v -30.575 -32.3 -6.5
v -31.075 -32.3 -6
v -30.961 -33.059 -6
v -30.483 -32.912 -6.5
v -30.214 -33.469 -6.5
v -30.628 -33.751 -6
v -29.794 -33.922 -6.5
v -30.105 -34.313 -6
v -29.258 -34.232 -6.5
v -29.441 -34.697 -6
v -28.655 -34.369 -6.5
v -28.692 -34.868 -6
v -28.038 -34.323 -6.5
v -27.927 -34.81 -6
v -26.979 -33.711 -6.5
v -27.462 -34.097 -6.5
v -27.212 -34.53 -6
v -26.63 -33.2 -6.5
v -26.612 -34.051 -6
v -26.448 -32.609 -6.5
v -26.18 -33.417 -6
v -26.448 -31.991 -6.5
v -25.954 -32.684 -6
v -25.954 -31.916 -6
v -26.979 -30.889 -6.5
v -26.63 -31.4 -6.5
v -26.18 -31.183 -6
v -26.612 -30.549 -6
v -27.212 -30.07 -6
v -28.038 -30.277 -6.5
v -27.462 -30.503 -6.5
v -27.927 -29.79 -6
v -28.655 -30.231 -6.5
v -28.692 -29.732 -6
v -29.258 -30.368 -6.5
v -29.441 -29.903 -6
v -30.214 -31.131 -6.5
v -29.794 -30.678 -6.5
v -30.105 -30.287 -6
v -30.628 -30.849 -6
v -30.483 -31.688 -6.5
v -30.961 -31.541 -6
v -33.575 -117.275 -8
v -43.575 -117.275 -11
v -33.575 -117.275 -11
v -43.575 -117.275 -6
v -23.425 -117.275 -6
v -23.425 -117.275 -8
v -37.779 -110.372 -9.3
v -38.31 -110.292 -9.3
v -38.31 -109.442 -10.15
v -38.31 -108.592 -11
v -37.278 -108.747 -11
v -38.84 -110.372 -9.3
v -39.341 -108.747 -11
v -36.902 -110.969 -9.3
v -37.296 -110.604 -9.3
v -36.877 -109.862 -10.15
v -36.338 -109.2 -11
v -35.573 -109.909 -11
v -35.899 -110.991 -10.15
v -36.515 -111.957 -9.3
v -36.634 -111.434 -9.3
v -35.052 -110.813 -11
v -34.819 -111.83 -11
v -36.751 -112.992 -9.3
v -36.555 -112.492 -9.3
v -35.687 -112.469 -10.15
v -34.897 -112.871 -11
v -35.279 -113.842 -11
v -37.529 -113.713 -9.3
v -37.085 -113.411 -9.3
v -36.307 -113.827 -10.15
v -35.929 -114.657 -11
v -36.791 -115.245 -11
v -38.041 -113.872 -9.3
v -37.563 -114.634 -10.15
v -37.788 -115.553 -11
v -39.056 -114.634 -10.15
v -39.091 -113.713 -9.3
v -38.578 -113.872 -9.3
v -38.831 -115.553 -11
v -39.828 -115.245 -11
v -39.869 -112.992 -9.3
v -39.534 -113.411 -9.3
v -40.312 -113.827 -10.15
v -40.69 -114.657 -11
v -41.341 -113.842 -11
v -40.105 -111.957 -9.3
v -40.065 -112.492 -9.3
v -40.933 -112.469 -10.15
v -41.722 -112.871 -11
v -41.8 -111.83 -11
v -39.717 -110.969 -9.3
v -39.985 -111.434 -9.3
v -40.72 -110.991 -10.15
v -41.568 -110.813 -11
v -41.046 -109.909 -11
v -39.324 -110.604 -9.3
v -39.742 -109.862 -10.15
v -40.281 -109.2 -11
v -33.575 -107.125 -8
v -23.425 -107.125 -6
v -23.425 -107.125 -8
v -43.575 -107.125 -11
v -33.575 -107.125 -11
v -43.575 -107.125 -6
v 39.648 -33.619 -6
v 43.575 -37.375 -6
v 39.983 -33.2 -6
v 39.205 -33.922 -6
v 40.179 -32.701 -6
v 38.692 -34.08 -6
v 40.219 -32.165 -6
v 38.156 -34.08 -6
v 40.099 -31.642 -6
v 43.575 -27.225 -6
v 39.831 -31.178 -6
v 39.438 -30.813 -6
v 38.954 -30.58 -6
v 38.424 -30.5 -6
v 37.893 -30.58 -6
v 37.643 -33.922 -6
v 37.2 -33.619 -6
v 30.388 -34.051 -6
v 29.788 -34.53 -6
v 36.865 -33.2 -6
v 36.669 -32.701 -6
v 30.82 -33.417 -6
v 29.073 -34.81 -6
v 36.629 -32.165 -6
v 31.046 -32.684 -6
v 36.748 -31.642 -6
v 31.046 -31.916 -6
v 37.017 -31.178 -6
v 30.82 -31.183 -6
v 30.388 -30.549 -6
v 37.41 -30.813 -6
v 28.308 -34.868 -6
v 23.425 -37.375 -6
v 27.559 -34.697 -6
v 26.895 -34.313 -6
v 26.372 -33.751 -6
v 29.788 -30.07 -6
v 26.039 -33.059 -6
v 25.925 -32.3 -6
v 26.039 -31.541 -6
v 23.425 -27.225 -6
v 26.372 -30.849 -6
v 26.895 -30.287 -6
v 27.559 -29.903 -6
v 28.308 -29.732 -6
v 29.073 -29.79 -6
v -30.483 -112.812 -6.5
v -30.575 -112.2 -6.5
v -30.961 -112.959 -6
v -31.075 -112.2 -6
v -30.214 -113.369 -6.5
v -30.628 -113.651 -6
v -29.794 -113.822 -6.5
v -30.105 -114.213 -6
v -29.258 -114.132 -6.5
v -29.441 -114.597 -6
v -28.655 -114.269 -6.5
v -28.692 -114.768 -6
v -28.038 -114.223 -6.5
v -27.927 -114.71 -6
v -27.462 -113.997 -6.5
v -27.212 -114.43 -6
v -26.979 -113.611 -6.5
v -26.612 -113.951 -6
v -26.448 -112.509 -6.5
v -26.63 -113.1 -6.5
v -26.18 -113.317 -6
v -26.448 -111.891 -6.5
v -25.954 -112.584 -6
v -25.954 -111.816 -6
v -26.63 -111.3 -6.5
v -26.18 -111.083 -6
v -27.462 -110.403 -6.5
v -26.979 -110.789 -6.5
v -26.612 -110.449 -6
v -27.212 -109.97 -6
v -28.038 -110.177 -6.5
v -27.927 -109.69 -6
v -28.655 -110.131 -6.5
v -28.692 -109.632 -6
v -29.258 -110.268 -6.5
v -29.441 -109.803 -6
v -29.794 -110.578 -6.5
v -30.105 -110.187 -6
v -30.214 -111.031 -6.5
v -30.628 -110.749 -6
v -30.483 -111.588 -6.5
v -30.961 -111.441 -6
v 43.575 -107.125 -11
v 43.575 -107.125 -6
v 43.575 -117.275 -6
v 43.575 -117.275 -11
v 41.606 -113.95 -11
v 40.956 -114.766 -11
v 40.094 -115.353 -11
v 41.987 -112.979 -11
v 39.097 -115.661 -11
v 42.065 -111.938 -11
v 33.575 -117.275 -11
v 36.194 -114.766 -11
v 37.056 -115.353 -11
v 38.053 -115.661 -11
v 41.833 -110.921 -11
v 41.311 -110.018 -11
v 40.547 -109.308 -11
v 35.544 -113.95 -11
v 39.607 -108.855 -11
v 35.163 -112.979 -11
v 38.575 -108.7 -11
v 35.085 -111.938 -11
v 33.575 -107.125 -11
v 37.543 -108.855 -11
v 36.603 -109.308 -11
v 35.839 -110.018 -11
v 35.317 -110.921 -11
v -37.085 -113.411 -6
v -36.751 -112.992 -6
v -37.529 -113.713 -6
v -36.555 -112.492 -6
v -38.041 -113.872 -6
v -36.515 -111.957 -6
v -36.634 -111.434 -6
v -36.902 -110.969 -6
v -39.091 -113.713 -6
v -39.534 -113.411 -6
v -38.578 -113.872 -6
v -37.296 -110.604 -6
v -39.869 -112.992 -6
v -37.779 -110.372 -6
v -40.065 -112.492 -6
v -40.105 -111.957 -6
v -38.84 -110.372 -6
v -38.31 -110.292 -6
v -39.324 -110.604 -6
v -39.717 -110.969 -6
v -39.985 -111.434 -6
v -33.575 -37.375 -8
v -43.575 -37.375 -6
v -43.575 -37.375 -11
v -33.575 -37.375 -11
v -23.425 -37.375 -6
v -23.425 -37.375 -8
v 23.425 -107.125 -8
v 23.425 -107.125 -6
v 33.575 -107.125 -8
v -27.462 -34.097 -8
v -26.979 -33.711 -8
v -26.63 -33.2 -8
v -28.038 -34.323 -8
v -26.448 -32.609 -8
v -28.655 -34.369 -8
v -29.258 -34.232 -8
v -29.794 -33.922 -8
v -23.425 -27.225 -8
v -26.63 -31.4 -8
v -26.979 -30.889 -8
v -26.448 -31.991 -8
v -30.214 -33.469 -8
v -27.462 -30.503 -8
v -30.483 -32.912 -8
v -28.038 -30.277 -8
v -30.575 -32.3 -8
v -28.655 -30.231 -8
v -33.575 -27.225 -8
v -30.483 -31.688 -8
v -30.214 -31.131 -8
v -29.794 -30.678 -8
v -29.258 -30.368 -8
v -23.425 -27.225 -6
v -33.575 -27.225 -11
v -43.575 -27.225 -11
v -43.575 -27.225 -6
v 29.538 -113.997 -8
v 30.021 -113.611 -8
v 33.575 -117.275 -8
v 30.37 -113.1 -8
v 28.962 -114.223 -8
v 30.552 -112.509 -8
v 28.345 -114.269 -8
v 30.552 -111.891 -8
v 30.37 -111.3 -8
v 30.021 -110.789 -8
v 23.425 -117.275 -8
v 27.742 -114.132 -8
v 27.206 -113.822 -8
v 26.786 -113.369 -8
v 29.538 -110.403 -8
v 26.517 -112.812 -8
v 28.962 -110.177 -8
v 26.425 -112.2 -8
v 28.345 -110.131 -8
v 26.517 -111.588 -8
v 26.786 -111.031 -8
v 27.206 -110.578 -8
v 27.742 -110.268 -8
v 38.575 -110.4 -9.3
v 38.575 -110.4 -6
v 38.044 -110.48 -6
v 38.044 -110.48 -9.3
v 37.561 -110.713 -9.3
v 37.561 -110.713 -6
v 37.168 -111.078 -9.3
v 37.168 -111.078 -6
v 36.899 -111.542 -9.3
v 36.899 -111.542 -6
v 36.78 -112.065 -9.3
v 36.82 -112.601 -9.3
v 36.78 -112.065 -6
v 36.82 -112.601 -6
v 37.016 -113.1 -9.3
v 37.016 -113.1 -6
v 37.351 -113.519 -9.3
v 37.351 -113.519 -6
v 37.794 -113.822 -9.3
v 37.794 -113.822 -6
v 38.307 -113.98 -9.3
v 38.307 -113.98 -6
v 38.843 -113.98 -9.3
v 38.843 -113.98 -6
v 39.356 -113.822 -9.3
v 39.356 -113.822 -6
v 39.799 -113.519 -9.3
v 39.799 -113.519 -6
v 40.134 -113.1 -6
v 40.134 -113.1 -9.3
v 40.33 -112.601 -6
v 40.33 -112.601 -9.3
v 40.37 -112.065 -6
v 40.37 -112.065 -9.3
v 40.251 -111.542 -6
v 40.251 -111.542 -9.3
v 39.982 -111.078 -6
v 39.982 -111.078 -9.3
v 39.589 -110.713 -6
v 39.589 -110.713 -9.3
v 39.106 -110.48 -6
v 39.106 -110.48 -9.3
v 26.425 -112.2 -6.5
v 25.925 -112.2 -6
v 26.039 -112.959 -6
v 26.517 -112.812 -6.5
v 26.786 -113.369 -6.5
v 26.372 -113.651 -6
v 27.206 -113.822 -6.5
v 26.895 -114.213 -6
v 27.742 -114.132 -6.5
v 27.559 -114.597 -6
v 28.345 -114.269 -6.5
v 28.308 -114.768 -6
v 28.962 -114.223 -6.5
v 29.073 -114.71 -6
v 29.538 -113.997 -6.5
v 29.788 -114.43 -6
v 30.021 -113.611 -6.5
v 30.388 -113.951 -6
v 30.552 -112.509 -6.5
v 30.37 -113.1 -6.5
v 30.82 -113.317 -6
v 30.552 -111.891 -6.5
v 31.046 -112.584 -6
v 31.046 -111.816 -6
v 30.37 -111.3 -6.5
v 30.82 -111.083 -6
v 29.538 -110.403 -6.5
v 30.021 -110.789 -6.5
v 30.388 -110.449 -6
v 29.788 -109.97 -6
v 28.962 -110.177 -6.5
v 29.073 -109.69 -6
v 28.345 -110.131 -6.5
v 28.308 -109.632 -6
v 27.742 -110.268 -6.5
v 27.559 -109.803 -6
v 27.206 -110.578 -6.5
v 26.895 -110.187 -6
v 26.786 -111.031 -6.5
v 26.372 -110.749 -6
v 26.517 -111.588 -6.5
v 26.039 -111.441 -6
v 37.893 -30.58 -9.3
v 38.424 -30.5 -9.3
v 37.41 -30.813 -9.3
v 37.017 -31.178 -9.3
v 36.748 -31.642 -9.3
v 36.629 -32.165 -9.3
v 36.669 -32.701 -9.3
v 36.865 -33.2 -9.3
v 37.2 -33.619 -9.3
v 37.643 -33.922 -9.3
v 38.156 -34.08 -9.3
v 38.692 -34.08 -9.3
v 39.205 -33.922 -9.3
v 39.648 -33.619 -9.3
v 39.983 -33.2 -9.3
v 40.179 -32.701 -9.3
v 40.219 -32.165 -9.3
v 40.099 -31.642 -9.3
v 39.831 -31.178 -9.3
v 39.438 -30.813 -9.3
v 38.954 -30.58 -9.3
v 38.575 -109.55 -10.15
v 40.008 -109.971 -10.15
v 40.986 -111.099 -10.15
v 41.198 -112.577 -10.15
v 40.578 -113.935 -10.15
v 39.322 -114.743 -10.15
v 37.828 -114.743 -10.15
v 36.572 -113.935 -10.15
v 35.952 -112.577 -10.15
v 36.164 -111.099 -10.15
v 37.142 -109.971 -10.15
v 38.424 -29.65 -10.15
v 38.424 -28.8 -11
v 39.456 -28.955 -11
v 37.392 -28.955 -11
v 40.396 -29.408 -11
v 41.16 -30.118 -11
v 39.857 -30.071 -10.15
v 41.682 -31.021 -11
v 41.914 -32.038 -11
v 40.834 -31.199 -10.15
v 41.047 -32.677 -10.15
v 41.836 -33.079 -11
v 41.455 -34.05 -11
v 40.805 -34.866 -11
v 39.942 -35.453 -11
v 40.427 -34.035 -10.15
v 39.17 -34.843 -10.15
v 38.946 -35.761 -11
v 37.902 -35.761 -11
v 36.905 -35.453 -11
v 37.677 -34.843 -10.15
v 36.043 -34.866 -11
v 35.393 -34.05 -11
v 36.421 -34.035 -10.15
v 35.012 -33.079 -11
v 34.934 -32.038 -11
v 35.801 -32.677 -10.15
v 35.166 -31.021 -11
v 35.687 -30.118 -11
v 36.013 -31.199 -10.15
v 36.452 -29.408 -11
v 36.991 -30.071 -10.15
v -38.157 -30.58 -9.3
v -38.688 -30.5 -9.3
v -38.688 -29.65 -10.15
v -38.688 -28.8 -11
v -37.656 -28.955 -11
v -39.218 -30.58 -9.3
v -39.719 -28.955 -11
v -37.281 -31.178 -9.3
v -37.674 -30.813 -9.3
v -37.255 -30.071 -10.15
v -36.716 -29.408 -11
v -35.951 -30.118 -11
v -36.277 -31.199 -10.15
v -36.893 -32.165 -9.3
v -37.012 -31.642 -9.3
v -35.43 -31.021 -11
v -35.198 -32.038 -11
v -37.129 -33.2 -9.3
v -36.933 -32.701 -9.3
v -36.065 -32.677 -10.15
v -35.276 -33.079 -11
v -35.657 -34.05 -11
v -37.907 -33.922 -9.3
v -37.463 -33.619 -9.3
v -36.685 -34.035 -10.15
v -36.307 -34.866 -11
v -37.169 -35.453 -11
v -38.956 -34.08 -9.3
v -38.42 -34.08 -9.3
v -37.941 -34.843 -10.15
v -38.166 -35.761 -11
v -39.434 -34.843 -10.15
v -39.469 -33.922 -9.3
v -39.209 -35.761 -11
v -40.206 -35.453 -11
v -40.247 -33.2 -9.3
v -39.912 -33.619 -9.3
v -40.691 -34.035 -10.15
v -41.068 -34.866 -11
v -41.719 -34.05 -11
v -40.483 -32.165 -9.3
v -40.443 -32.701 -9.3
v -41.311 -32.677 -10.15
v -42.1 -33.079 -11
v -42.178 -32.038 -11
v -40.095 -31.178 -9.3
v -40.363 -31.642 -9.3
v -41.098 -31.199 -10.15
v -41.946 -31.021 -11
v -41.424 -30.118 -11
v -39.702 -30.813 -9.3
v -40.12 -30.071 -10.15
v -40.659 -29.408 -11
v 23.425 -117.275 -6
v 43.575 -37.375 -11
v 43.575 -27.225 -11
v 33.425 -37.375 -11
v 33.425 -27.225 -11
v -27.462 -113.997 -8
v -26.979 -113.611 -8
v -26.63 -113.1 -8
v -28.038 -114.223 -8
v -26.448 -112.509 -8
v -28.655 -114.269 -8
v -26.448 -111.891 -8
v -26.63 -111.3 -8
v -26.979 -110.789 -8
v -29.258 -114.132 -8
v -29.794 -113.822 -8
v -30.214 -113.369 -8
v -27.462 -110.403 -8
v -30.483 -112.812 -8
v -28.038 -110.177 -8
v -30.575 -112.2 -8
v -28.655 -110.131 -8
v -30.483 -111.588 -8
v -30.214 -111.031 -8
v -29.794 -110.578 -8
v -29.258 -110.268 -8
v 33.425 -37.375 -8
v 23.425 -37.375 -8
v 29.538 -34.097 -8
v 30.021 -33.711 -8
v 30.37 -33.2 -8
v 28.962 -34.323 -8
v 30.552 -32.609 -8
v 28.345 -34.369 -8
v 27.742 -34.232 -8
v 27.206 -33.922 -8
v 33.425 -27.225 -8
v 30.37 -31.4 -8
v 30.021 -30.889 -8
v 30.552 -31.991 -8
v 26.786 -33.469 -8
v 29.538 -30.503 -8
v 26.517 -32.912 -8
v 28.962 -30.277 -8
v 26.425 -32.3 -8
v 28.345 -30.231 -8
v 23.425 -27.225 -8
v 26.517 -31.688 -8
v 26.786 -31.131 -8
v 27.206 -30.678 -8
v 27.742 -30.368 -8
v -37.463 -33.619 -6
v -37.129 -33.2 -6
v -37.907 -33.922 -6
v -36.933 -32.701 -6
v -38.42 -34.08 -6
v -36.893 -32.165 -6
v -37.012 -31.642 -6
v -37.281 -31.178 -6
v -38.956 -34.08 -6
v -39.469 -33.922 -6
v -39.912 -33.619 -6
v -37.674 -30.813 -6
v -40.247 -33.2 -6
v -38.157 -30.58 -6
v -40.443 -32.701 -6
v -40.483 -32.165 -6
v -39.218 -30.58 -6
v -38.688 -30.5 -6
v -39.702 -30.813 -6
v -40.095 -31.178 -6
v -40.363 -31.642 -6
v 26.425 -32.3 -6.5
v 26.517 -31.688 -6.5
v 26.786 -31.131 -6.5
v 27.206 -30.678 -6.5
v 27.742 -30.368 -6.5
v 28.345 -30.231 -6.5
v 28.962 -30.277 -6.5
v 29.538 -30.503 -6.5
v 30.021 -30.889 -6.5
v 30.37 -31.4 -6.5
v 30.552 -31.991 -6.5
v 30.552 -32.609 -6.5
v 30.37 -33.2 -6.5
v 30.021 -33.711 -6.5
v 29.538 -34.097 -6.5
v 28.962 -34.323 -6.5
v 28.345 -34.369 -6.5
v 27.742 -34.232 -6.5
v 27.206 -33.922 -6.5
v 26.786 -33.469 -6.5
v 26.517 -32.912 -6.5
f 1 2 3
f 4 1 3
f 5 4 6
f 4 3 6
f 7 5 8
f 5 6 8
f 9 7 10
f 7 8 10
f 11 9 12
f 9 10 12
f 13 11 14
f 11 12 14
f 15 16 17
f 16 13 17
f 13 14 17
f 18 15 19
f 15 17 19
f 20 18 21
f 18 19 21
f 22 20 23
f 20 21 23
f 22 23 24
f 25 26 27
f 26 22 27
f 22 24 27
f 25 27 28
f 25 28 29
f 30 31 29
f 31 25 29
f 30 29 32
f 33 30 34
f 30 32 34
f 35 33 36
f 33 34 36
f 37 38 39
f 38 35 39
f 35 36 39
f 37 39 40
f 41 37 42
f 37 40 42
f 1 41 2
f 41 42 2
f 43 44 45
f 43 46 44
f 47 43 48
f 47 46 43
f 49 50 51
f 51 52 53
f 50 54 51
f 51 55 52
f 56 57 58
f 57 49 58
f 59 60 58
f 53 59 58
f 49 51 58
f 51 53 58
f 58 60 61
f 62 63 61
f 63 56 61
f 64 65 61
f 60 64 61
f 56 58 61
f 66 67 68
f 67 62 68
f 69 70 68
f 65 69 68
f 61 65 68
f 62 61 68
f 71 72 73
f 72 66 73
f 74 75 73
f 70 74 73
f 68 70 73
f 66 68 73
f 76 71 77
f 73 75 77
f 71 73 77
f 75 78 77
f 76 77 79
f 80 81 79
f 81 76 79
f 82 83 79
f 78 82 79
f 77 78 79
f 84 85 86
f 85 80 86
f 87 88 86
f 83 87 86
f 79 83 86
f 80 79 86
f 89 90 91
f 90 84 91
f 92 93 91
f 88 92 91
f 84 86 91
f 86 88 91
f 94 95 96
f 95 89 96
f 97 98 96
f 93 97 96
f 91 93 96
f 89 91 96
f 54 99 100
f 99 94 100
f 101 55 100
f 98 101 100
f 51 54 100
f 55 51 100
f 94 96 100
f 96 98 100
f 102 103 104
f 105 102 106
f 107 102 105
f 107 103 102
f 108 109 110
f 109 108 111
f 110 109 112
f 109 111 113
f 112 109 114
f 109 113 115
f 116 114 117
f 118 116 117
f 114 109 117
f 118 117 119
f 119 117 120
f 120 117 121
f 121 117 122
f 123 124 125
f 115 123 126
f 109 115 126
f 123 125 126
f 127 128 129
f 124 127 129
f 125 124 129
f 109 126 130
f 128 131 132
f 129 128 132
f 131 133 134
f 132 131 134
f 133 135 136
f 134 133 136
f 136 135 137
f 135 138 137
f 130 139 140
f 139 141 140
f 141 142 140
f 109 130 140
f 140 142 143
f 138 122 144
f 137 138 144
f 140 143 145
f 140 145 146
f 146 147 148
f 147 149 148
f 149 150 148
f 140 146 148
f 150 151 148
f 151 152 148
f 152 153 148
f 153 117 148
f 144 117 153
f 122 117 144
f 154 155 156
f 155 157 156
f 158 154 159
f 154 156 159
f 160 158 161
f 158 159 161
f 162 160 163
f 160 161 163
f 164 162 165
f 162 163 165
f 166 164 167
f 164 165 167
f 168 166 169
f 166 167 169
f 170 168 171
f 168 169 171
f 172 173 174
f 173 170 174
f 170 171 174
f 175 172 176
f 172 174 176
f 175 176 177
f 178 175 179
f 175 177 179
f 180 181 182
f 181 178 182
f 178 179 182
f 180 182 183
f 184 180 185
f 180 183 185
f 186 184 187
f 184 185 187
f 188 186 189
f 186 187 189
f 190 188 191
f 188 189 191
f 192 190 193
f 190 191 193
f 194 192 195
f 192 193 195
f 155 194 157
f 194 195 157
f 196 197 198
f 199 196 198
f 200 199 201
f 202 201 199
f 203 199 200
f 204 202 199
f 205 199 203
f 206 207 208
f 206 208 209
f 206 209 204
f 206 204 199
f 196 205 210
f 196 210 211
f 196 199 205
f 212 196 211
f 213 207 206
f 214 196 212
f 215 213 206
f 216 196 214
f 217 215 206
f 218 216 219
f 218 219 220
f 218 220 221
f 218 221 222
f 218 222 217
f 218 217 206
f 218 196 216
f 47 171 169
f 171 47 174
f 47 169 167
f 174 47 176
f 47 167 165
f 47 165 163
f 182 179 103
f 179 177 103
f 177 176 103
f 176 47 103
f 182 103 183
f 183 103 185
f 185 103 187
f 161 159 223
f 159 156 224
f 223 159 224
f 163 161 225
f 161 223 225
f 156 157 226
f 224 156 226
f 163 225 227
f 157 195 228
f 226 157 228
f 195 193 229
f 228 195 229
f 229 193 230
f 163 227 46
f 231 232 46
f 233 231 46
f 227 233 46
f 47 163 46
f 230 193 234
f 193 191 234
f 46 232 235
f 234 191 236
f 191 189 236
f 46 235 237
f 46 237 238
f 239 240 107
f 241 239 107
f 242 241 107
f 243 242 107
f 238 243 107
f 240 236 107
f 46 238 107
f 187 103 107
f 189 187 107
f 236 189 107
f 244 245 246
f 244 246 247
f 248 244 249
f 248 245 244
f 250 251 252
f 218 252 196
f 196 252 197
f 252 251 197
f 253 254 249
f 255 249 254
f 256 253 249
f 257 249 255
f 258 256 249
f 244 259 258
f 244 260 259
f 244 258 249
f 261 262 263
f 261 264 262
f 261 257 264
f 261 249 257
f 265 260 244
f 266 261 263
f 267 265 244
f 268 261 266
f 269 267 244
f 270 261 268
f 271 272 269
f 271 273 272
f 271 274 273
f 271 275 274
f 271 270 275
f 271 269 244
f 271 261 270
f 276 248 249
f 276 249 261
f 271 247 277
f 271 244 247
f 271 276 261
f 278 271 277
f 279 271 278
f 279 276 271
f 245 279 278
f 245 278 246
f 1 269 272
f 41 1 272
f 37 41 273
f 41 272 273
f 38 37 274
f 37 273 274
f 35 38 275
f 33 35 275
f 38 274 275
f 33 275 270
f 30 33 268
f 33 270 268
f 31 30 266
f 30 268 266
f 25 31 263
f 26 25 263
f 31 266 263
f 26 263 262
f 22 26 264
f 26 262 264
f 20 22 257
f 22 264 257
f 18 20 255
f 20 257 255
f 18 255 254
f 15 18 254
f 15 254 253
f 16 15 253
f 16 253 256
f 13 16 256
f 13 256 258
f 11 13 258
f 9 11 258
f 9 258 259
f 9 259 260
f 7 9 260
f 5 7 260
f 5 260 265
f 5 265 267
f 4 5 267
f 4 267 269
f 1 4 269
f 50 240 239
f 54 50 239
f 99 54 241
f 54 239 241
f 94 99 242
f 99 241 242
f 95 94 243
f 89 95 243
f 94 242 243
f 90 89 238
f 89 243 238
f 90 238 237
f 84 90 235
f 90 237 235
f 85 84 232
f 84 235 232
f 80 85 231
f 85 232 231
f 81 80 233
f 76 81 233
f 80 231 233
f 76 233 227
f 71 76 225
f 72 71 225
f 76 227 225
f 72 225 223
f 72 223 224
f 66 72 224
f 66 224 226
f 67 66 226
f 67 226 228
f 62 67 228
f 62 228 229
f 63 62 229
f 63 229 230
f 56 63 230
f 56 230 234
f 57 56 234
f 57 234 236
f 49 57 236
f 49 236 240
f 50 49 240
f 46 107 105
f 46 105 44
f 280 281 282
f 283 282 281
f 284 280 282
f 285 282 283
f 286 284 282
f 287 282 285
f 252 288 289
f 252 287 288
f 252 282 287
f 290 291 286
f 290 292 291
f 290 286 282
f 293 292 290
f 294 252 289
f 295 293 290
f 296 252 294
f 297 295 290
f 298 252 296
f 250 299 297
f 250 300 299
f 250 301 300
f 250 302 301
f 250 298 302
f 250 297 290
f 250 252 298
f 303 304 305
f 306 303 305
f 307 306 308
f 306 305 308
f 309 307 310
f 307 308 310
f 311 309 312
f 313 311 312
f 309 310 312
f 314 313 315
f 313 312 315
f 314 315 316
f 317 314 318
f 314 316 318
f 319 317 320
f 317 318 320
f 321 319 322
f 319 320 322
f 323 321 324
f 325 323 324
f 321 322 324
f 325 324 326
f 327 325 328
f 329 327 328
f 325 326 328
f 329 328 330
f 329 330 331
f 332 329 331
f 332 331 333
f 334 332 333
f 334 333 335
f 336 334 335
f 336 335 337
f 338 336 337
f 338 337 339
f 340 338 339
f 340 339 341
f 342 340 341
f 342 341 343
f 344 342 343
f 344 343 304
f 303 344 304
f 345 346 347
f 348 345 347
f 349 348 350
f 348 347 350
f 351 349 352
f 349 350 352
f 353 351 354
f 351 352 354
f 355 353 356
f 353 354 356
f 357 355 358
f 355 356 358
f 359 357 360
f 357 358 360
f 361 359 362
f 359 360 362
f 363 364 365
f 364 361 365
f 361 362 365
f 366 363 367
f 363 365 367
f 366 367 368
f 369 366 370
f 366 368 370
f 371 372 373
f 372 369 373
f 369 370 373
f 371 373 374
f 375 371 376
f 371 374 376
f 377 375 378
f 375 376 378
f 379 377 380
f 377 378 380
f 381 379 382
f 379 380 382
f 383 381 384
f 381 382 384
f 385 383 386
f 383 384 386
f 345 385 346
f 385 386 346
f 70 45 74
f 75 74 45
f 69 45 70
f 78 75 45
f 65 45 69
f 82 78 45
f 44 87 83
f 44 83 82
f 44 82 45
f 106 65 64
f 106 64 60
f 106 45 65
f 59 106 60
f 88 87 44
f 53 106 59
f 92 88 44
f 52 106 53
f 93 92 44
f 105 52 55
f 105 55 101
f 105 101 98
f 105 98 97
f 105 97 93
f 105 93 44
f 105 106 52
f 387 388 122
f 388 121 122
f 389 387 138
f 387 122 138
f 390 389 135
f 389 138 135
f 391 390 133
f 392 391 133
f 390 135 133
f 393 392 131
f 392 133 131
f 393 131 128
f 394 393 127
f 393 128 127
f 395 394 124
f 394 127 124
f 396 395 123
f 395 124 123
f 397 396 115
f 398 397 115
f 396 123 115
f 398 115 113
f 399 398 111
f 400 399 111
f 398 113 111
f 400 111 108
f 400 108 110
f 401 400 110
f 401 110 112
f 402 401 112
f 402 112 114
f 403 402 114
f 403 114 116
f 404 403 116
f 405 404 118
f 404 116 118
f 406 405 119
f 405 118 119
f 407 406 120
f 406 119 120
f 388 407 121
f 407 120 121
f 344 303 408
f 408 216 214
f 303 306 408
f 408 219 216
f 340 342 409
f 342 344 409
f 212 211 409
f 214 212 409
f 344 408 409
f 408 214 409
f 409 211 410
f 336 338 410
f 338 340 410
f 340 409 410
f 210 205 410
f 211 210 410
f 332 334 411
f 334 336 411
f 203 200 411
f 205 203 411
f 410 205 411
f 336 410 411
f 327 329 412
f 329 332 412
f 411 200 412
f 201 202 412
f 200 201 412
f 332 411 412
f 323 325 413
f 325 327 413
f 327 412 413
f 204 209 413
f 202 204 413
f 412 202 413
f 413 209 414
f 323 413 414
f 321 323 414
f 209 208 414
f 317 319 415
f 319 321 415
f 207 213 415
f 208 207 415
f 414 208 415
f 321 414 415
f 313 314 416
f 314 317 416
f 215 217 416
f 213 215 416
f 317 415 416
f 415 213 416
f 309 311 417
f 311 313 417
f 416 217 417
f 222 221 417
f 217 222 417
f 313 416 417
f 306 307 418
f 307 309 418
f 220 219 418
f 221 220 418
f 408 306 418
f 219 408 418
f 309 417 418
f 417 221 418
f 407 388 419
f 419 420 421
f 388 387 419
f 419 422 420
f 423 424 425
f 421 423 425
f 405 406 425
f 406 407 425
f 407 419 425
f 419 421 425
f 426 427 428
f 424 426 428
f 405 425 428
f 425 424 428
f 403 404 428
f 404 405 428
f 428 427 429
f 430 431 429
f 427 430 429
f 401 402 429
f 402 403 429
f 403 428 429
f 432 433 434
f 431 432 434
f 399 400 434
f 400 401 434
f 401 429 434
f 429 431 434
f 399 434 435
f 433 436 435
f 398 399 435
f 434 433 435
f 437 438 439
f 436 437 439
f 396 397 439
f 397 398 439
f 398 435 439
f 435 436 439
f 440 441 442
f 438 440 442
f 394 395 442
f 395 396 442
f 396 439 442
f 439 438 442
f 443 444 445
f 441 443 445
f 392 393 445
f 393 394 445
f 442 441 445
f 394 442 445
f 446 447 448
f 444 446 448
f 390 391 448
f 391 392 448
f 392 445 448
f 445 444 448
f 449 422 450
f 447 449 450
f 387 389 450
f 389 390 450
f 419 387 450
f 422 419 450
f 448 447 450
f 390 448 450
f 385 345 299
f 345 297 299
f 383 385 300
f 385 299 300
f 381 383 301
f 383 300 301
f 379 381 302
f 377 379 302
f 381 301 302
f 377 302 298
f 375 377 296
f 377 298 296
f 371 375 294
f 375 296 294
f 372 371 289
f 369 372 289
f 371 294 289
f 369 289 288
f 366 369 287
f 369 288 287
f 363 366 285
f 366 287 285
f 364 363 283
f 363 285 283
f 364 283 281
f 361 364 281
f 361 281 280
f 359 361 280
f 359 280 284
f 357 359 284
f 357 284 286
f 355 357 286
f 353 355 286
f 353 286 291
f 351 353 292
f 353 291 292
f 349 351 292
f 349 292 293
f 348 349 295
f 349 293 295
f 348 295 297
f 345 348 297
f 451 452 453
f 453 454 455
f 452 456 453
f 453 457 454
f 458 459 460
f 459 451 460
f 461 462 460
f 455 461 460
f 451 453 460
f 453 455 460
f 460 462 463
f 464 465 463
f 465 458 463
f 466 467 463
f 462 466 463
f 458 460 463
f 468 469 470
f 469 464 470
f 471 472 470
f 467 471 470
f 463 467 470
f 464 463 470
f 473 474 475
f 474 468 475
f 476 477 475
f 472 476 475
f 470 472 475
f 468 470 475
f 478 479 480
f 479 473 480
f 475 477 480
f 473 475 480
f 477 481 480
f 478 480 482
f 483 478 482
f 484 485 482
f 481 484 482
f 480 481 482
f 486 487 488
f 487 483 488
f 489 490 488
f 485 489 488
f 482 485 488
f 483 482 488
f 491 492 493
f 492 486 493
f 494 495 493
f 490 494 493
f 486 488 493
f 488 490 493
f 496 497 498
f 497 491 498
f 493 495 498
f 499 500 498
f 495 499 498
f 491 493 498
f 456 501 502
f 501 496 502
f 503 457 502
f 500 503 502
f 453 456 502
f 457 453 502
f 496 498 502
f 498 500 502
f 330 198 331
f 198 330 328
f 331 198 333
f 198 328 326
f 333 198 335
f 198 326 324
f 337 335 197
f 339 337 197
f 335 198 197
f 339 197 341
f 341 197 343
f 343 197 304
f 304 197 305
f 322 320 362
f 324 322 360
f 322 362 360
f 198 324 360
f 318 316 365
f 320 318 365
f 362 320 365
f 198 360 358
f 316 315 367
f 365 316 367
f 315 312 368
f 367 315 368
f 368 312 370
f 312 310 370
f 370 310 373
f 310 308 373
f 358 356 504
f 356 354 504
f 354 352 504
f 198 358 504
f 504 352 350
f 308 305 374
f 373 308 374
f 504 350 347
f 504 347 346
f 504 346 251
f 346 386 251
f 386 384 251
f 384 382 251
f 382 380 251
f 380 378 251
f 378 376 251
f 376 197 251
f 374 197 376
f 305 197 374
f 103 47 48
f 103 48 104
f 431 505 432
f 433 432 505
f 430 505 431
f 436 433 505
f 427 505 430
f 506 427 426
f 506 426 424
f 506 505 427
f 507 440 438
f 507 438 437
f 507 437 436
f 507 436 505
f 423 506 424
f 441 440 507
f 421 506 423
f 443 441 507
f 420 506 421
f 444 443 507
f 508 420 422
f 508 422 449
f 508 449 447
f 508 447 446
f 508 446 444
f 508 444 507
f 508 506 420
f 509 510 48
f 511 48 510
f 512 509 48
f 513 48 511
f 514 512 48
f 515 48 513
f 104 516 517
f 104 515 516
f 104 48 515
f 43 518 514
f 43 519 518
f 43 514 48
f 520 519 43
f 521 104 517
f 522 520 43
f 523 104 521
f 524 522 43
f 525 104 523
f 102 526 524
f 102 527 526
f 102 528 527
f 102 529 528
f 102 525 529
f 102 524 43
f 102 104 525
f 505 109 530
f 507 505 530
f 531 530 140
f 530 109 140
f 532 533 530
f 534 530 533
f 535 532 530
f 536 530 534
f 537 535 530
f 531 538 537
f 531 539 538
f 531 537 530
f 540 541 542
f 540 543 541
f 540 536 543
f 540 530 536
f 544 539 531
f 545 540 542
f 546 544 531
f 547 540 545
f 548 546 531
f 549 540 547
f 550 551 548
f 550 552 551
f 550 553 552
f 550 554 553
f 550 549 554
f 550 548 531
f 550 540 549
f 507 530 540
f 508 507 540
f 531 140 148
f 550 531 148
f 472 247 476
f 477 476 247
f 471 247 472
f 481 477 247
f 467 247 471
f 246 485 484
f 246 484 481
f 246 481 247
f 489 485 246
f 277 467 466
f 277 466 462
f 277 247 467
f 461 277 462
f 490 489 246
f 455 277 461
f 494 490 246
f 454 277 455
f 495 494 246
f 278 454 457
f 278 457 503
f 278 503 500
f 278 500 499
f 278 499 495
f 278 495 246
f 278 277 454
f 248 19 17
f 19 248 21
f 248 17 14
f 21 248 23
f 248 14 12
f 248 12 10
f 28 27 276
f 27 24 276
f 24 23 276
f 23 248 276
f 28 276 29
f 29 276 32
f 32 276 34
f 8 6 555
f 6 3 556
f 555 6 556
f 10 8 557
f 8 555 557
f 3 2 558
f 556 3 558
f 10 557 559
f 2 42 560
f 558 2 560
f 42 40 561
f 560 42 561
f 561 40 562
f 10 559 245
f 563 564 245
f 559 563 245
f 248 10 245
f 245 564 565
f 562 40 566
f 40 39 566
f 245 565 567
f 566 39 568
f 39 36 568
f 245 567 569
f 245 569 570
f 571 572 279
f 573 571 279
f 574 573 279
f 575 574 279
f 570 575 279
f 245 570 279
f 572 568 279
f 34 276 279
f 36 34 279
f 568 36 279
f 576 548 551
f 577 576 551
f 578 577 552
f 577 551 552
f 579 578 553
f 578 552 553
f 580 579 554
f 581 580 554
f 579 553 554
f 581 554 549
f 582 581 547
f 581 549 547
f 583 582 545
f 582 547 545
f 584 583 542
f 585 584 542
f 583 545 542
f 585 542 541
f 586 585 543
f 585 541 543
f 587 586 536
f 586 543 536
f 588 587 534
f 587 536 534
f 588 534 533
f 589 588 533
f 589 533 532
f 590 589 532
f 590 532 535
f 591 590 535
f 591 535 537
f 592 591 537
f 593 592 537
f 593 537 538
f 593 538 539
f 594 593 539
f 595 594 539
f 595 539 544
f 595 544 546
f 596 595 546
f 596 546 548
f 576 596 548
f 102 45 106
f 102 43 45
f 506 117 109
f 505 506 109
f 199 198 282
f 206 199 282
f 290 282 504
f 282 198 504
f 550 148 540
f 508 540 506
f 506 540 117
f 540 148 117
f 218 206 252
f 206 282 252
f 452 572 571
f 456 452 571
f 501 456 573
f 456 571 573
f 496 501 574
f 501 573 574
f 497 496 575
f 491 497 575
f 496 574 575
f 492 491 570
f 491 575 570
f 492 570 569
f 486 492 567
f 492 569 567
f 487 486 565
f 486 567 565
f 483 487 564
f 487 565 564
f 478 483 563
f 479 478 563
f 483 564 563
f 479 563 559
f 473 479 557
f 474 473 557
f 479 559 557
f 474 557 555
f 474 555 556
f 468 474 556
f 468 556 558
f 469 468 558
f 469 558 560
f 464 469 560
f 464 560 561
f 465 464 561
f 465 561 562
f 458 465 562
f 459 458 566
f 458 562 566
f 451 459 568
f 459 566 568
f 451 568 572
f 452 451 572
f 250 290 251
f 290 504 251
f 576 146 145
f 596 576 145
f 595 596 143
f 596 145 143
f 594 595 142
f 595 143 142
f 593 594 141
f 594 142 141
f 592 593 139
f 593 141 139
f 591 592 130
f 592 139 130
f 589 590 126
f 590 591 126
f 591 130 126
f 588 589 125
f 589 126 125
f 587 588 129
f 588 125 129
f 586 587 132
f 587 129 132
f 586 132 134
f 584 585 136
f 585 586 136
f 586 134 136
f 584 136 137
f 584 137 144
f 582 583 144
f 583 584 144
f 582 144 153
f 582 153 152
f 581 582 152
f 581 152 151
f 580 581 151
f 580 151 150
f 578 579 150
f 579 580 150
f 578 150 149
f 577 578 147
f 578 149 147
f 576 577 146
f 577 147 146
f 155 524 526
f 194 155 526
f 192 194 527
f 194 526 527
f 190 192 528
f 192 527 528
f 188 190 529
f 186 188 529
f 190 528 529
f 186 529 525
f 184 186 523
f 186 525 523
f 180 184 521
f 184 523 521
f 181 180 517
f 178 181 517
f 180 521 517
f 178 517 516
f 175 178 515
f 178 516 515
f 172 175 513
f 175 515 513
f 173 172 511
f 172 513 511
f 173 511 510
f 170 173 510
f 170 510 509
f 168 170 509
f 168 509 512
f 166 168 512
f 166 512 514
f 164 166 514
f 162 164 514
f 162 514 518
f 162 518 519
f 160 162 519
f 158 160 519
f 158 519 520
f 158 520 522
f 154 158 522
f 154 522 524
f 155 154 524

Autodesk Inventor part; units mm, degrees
ref_plane "YZ Plane" through (0, 0, 0) normal (1, 0, 0) x (0, 1, 0)
ref_plane "XZ Plane" through (0, 0, 0) normal (0, 1, 0) x (-1, 0, 0)
ref_plane "XY Plane" through (0, 0, 0) normal (0, 0, 1) x (1, 0, 0)
ref_plane "Work Plane1" through (0, 5.7871, -6) normal (0, 0, -1) x (-1, 0, 0)
sketch "Sketch1" plane through (0, 5.7871, -6) normal (0, 0, -1) x (-1, 0, 0)
  circle A0 centre (-28.5, -38.0871) radius 2.075 projected
  circle A1 centre (-28.5, -117.9871) radius 2.075 projected
  circle A2 centre (28.5, -38.0871) radius 2.075 projected
  circle A3 centre (28.5, -117.9871) radius 2.075 projected
  line L0 (-30.2, -121.9121) -> (30.2, -121.9121) projected
  arc A4 (30.2, -121.9121) -> (32.5, -119.6121) centre (30.2, -119.6121) ccw projected
  line L1 (32.5, -119.6121) -> (32.5, -16.2121) projected
  arc A5 (32.5, -16.2121) -> (30.2, -13.9121) centre (30.2, -16.2121) ccw projected
  line L2 (30.2, -13.9121) -> (-30.2, -13.9121) projected
  arc A6 (-30.2, -13.9121) -> (-32.5, -16.2121) centre (-30.2, -16.2121) ccw projected
  line L3 (-32.5, -16.2121) -> (-32.5, -119.6121) projected
  arc A7 (-32.5, -119.6121) -> (-30.2, -121.9121) centre (-30.2, -119.6121) ccw projected
  line L4 (43.575, -123.0621) -> (23.425, -123.0621)
  line L5 (23.425, -123.0621) -> (23.425, -112.9121)
  line L6 (23.425, -112.9121) -> (43.575, -112.9121)
  line L7 (43.575, -112.9121) -> (43.575, -123.0621)
  line L8 (-43.575, -123.0621) -> (-23.425, -123.0621)
  line L9 (-23.425, -123.0621) -> (-23.425, -112.9121)
  line L10 (-23.425, -112.9121) -> (-43.575, -112.9121)
  line L11 (-43.575, -112.9121) -> (-43.575, -123.0621)
  line L12 (-43.575, -43.1621) -> (-23.425, -43.1621)
  line L13 (-23.425, -43.1621) -> (-23.425, -33.0121)
  line L14 (-23.425, -33.0121) -> (-43.575, -33.0121)
  line L15 (-43.575, -33.0121) -> (-43.575, -43.1621)
  line L16 (43.575, -43.1621) -> (23.425, -43.1621)
  line L17 (23.425, -43.1621) -> (23.425, -33.0121)
  line L18 (23.425, -33.0121) -> (43.575, -33.0121)
  line L19 (43.575, -33.0121) -> (43.575, -43.1621)
  circle A8 centre (28.5, -117.9871) radius 5.075
  circle A9 centre (-28.5, -117.9871) radius 5.075
  circle A10 centre (28.5, -38.0871) radius 5.075
  circle A11 centre (-28.5, -38.0871) radius 5.075
  line L20 (33.575, -33.0121) -> (33.575, -43.1621)
  line L21 (-33.575, -33.0121) -> (-33.575, -43.1621)
  line L22 (-33.575, -112.9121) -> (-33.575, -123.0621)
  line L23 (33.5, -112.9121) -> (33.5, -123.0621)
  point P0 (0, -5.7871)
  dimension "d0" = 3
  dimension "d1" = 3
  dimension "d2" = 3
  dimension "d3" = 3
  dimension "d5" = 10
  dimension "d6" = 10
  dimension "d7" = 10
  dimension "d8" = 10
extrude "Extrusion1" add sketch "Sketch1" along normal blind 2 contours A0 | A1 | A2 | A3 | A7 L3 A9 L0 | L0 A9 L3 A7 | A9 L9 L0 | L0 L9 L8 A9 | L8 L22 A9 | A9 L10 L9 | A9 L22 L10 L3 | L3 L10 A9 | L5 A8 L0 | L0 A8 L4 L5 | L8 L11 L10 L22 | A8 L1 A4 L0 | L0 A4 L1 A8 L23 | L5 L6 A8 | L12 L21 A11 L3 | L3 A11 L12 | A8 L23 L4 | L6 L1 A8 | A11 L3 | L3 A11 | L12 L15 L14 L21 | A11 L13 L12 | L23 A8 L6 L7 L4 | L23 A8 | L6 L23 A8 L1 | A11 L21 L14 L3 | L3 L14 A11 | A11 L14 L13 | L16 A10 L1 | L1 A10 L20 L16 | A10 L1 | L1 A10 | L20 L18 L19 L16 | L16 L17 A10 | A10 L18 L1 | L1 L18 L20 A10 | L17 L18 A10
sketch "Sketch3" plane through (0, 5.7871, -8) normal (0, 0, -1) x (-1, 0, 0)
  circle A0 centre (-28.5, -38.0871) radius 2.075 projected
  circle A1 centre (28.5, -38.0871) radius 2.075 projected
  circle A2 centre (28.5, -117.9871) radius 2.075 projected
  circle A3 centre (-28.5, -117.9871) radius 2.075 projected
  point P0 (0, -5.7871)
extrude "Extrusion3" cut sketch "Sketch3" against normal through all
chamfer "Chamfer1" distance 0.5 angle 45 4 edges at (30.575, -32.3, -6) (-26.425, -32.3, -6) (-26.425, -112.2, -6) (30.575, -112.2, -6)
sketch "Sketch6" plane through (0, 5.7871, -8) normal (0, 0, -1) x (-1, 0, 0)
  circle A0 centre (28.5, -38.0871) radius 2.075 projected
  line L0 (43.575, -33.0121) -> (23.425, -33.0121) projected
  line L1 (23.425, -33.0121) -> (23.425, -43.1621) projected
  line L2 (23.425, -43.1621) -> (43.575, -43.1621) projected
  line L3 (43.575, -43.1621) -> (43.575, -33.0121) projected
  circle A1 centre (-28.5, -38.0871) radius 2.075 projected
  line L4 (-23.425, -43.1621) -> (-23.425, -33.0121) projected
  line L5 (-23.425, -33.0121) -> (-43.575, -33.0121) projected
  line L6 (-43.575, -33.0121) -> (-43.575, -43.1621) projected
  line L7 (-43.575, -43.1621) -> (-23.425, -43.1621) projected
  circle A2 centre (28.5, -117.9871) radius 2.075 projected
  line L8 (43.575, -112.9121) -> (23.425, -112.9121) projected
  line L9 (23.425, -112.9121) -> (23.425, -123.0621) projected
  line L10 (23.425, -123.0621) -> (43.575, -123.0621) projected
  line L11 (43.575, -123.0621) -> (43.575, -112.9121) projected
  circle A3 centre (-28.5, -117.9871) radius 2.075 projected
  line L12 (-43.575, -123.0621) -> (-23.425, -123.0621) projected
  line L13 (-23.425, -123.0621) -> (-23.425, -112.9121) projected
  line L14 (-23.425, -112.9121) -> (-43.575, -112.9121) projected
  line L15 (-43.575, -112.9121) -> (-43.575, -123.0621) projected
  line L16 (43.575, -123.0621) -> (33.575, -123.0621)
  line L17 (33.575, -123.0621) -> (33.575, -112.9121)
  line L18 (33.575, -112.9121) -> (43.575, -112.9121)
  line L19 (43.575, -112.9121) -> (43.575, -123.0621)
  line L20 (-43.575, -123.0621) -> (-33.575, -123.0621)
  line L21 (-33.575, -123.0621) -> (-33.575, -112.9121)
  line L22 (-33.575, -112.9121) -> (-43.575, -112.9121)
  line L23 (-43.575, -112.9121) -> (-43.575, -123.0621)
  line L24 (43.575, -43.1621) -> (33.575, -43.1621)
  line L25 (33.575, -43.1621) -> (33.575, -33.0121)
  line L26 (33.575, -33.0121) -> (43.575, -33.0121)
  line L27 (43.575, -33.0121) -> (43.575, -43.1621)
  line L28 (-23.425, -43.1621) -> (-33.425, -43.1621)
  line L29 (-33.425, -43.1621) -> (-33.425, -33.0121)
  line L30 (-33.425, -33.0121) -> (-23.425, -33.0121)
  line L31 (-23.425, -33.0121) -> (-23.425, -43.1621)
  point P0 (0, -5.7871)
  point P1 (33.575, -112.9121)
  point P2 (33.575, -33.0121)
  point P3 (33.575, -43.1621)
  point P4 (-33.425, -33.0121)
  point P5 (-33.575, -112.9121)
  dimension "d46" = 10
  dimension "d47" = 10.15
  dimension "d48" = 10
  dimension "d49" = 10.15
  dimension "d50" = 10
  dimension "d51" = 10.15
  dimension "d52" = 10
  dimension "d53" = 10.15
extrude "Extrusion5" add sketch "Sketch6" along normal blind 3 contours L3 L2 L25 L0 | L7 L6 L5 L29 | L11 L10 L17 L8 | L15 L14 L21 L12
sketch "Sketch7" plane through (0, 5.7871, -11) normal (0, 0, -1) x (-1, 0, 0)
  line L0 (33.575, -123.0621) -> (43.575, -123.0621) projected
  line L1 (43.575, -123.0621) -> (43.575, -112.9121) projected
  line L2 (43.575, -112.9121) -> (33.575, -112.9121) projected
  line L3 (-33.575, -112.9121) -> (-43.575, -112.9121) projected
  line L4 (-43.575, -112.9121) -> (-43.575, -123.0621) projected
  line L5 (-43.575, -123.0621) -> (-33.575, -123.0621) projected
  line L6 (-33.575, -123.0621) -> (-33.575, -112.9121) projected
  line L7 (-43.575, -43.1621) -> (-33.425, -43.1621) projected
  line L8 (-33.425, -43.1621) -> (-33.425, -33.0121) projected
  line L9 (-33.425, -33.0121) -> (-43.575, -33.0121) projected
  line L10 (-43.575, -33.0121) -> (-43.575, -43.1621) projected
  line L11 (33.575, -43.1621) -> (43.575, -43.1621) projected
  line L12 (43.575, -43.1621) -> (43.575, -33.0121) projected
  line L13 (43.575, -33.0121) -> (33.575, -33.0121) projected
  line L14 (23.425, -123.0621) -> (43.575, -123.0621) projected
  line L15 (43.575, -123.0621) -> (33.0445, -112.6955)
  line L16 (-43.575, -123.0621) -> (-23.425, -123.0621) projected
  line L17 (-43.575, -123.0621) -> (-33.5, -112.9121)
  line L18 (-23.425, -112.9121) -> (-43.575, -112.9121) projected
  line L19 (-43.575, -33.0121) -> (-43.575, -43.1621) projected
  line L20 (-43.575, -33.0121) -> (-33.425, -43.0871)
  line L21 (43.575, -43.1621) -> (43.575, -33.0121) projected
  line L22 (43.575, -33.0121) -> (33.5, -43.1621)
  line L23 (23.425, -43.1621) -> (43.575, -43.1621) projected
  line L24 (33.575, -33.0121) -> (43.8006, -43.1621)
  line L25 (43.575, -123.0621) -> (43.575, -112.9121) projected
  line L26 (-43.575, -112.9121) -> (-43.575, -123.0621) projected
  line L27 (-43.575, -112.9121) -> (-33.575, -123.0621)
  line L28 (-23.425, -33.0121) -> (-43.575, -33.0121) projected
  line L29 (-33.2728, -33.0121) -> (-43.575, -43.1621)
  line L30 (33.575, -33.0121) -> (33.575, -43.1621) projected
  line L31 (33.575, -112.9121) -> (33.575, -123.0621) projected
  point P0 (0, -5.7871)
  point P1 (33.575, -37.375)
  point P2 (38.3097, -117.8788)
  point P3 (-38.575, -117.9871)
  point P4 (-38.4239, -38.0871)
  point P5 (38.6878, -38.0871)
hole "Hole2" at (-38.3097, -112.0917, -11) at (38.575, -112.2, -11) at (38.4239, -32.3, -11) at (-38.6878, -32.3, -11) direction (0, 0, 1) diameter 3.6 depth 15 countersink diameter 7 countersink angle 90 clearance for "Countersunk Flat Head Screw ISO 2009/7046" size "M3" standard "ISO"
equation "\"d1\" = d0"
equation "\"d2\" = d0"
equation "\"d3\" = d0"
equation "\"d6\" = d5"
equation "\"d7\" = d5"
equation "\"d8\" = d5"
properties part number "BMS_hold_check"
